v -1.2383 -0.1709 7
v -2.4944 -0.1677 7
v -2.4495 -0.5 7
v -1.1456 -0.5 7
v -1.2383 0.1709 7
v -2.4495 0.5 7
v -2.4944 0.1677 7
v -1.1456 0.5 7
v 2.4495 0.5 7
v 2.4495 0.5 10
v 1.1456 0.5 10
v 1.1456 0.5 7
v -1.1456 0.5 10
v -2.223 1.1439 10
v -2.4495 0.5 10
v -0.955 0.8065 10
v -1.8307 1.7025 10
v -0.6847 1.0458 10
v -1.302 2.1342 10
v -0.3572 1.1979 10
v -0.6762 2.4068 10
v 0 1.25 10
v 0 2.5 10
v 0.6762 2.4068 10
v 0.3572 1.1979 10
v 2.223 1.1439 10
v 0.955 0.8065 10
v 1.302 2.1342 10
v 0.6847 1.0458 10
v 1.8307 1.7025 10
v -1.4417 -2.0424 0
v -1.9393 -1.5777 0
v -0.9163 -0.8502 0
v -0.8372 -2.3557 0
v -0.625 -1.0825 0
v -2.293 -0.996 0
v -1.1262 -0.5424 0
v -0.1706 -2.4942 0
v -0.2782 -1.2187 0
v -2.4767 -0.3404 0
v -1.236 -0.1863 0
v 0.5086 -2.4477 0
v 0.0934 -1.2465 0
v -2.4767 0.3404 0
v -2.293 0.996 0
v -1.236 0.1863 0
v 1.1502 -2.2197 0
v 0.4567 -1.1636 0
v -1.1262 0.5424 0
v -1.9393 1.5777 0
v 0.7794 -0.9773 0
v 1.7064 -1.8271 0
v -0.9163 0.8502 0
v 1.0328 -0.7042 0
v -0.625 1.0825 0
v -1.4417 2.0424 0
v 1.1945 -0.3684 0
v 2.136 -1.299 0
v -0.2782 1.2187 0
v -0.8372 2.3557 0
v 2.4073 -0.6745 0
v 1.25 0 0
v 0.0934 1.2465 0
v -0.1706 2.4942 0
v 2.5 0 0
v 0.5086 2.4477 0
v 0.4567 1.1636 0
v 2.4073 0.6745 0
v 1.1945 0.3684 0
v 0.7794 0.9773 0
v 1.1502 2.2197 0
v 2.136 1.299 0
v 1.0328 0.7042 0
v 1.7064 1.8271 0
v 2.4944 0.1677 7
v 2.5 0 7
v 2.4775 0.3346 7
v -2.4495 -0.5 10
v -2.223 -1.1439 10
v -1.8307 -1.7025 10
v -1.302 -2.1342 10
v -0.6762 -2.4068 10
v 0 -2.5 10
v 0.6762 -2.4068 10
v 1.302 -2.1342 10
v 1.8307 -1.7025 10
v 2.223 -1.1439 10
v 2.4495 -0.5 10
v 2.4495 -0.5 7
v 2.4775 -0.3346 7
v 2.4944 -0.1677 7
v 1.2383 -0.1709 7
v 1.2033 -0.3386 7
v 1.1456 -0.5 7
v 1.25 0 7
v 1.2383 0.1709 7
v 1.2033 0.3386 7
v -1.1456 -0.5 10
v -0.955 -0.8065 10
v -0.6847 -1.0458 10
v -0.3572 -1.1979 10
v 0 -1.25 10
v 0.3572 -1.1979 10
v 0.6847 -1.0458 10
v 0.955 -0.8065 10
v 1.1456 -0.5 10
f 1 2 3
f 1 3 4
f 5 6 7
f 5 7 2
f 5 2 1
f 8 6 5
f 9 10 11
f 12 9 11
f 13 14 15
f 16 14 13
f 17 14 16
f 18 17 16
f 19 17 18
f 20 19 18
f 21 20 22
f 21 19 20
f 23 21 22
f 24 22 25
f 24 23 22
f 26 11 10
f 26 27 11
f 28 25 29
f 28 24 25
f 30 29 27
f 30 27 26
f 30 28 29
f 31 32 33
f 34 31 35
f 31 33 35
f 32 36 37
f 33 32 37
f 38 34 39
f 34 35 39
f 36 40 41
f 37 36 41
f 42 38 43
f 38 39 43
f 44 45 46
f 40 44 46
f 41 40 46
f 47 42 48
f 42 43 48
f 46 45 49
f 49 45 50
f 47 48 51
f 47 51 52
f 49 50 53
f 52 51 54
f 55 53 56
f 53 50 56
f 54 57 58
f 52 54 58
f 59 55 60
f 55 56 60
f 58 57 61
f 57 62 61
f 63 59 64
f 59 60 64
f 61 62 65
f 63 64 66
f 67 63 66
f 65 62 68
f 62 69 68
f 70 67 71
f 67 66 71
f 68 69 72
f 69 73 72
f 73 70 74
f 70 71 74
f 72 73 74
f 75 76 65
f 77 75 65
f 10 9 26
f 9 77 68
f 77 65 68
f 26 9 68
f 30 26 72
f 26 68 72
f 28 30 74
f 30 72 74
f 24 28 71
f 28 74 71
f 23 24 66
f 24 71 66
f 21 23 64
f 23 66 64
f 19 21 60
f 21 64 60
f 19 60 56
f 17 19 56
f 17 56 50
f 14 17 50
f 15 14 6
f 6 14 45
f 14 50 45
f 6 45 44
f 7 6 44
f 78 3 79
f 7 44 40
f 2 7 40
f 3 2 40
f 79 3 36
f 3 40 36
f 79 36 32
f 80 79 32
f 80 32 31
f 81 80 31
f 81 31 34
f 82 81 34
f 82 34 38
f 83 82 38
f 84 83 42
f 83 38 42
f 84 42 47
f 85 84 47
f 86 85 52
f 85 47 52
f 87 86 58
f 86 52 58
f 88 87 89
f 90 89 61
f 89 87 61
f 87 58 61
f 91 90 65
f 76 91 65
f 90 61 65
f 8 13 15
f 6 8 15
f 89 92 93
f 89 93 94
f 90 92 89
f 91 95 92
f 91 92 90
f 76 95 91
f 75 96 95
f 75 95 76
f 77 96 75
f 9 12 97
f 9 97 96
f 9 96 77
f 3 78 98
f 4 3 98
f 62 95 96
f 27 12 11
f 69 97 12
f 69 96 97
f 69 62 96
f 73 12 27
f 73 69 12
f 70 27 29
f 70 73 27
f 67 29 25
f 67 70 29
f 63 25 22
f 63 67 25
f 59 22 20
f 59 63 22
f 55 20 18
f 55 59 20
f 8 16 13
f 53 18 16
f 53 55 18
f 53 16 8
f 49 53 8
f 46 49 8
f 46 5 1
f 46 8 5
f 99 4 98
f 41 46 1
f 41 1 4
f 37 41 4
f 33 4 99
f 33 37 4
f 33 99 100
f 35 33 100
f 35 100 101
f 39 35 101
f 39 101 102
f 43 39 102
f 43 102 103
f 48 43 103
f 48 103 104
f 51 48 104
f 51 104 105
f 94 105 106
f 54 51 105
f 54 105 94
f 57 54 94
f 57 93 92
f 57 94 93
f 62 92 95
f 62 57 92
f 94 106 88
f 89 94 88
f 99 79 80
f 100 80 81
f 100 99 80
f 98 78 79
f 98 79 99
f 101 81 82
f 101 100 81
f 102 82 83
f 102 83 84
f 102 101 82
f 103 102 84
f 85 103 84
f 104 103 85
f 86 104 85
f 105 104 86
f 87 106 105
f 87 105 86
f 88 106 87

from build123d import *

# Parameters (mm, degrees)
F0_R     = 2.5
F0_R_2   = 1.25
F1_DEPTH = 10
F3_DEPTH = 3


with BuildPart() as f1:
    # F0 (on Top) → F1 (new body)
    with BuildSketch(Plane.XY):
        Circle(F0_R)
        Circle(F0_R_2, mode=Mode.SUBTRACT)
    extrude(amount=F1_DEPTH)

    # F2 (on face) → F3 (cut)
    with BuildSketch(Plane.XY.offset(10)):
        with BuildLine():
            Line((-1.1456439237, 0.5), (-2.4494897428, 0.5))
            ThreePointArc((-2.4494897428, 0.5), (-2.5, 0), (-2.4494897428, -0.5))
            Line((-2.4494897428, -0.5), (-1.1456439237, -0.5))
            ThreePointArc((-1.1456439237, -0.5), (-1.25, 0), (-1.1456439237, 0.5))
        make_face()
        with BuildLine():
            ThreePointArc((2.5, 0), (2.4873403825, 0.251272405), (2.4494897428, 0.5))
            Line((2.4494897428, 0.5), (1.1456439237, 0.5))
            ThreePointArc((1.1456439237, 0.5), (1.2236328912, 0.2553870546), (1.25, 0))
            ThreePointArc((1.25, 0), (1.2236328912, -0.2553870546), (1.1456439237, -0.5))
            Line((1.1456439237, -0.5), (2.4494897428, -0.5))
            ThreePointArc((2.4494897428, -0.5), (2.4873403825, -0.251272405), (2.5, 0))
        make_face()
    extrude(amount=-F3_DEPTH, mode=Mode.SUBTRACT)


solid = f1.part
